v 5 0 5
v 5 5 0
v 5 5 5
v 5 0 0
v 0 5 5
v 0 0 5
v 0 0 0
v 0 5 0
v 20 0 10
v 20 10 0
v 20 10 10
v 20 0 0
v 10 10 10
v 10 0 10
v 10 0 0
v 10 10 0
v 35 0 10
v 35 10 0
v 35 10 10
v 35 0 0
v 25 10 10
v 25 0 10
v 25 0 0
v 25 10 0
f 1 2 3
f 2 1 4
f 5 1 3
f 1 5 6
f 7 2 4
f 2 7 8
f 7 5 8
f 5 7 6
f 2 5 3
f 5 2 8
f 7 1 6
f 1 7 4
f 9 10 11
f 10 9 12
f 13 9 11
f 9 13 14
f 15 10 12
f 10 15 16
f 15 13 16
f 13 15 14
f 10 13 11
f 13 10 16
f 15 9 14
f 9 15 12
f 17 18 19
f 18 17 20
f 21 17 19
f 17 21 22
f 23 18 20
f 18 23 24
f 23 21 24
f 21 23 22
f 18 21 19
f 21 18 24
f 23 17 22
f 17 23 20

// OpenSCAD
/*
 * Both the scale and resize functions alter the size of the object in up to three dimensions.
 * Scale Parameters:
 *      - scale has a vector as input which represents a multiplicative approach to scaling the object
 *
 * Resize Parameters:
 *      - resize has a vector as input which represents an exact numerical size for the object to be converted to
 */

original_cube = [5, 5, 5]; // Our reference cube dimensions.

cube(original_cube); // Our reference cube.

// '{' defines the scope of translate.
translate([10, 0, 0]) {
    scale([2, 2, 2]) // Doubles the cube's size in all direction.
        cube(original_cube);
}

translate([25, 0, 0]) {
    resize([10, 10, 10]) // Exact dimensions to resize our cube.
        cube(original_cube);
}
